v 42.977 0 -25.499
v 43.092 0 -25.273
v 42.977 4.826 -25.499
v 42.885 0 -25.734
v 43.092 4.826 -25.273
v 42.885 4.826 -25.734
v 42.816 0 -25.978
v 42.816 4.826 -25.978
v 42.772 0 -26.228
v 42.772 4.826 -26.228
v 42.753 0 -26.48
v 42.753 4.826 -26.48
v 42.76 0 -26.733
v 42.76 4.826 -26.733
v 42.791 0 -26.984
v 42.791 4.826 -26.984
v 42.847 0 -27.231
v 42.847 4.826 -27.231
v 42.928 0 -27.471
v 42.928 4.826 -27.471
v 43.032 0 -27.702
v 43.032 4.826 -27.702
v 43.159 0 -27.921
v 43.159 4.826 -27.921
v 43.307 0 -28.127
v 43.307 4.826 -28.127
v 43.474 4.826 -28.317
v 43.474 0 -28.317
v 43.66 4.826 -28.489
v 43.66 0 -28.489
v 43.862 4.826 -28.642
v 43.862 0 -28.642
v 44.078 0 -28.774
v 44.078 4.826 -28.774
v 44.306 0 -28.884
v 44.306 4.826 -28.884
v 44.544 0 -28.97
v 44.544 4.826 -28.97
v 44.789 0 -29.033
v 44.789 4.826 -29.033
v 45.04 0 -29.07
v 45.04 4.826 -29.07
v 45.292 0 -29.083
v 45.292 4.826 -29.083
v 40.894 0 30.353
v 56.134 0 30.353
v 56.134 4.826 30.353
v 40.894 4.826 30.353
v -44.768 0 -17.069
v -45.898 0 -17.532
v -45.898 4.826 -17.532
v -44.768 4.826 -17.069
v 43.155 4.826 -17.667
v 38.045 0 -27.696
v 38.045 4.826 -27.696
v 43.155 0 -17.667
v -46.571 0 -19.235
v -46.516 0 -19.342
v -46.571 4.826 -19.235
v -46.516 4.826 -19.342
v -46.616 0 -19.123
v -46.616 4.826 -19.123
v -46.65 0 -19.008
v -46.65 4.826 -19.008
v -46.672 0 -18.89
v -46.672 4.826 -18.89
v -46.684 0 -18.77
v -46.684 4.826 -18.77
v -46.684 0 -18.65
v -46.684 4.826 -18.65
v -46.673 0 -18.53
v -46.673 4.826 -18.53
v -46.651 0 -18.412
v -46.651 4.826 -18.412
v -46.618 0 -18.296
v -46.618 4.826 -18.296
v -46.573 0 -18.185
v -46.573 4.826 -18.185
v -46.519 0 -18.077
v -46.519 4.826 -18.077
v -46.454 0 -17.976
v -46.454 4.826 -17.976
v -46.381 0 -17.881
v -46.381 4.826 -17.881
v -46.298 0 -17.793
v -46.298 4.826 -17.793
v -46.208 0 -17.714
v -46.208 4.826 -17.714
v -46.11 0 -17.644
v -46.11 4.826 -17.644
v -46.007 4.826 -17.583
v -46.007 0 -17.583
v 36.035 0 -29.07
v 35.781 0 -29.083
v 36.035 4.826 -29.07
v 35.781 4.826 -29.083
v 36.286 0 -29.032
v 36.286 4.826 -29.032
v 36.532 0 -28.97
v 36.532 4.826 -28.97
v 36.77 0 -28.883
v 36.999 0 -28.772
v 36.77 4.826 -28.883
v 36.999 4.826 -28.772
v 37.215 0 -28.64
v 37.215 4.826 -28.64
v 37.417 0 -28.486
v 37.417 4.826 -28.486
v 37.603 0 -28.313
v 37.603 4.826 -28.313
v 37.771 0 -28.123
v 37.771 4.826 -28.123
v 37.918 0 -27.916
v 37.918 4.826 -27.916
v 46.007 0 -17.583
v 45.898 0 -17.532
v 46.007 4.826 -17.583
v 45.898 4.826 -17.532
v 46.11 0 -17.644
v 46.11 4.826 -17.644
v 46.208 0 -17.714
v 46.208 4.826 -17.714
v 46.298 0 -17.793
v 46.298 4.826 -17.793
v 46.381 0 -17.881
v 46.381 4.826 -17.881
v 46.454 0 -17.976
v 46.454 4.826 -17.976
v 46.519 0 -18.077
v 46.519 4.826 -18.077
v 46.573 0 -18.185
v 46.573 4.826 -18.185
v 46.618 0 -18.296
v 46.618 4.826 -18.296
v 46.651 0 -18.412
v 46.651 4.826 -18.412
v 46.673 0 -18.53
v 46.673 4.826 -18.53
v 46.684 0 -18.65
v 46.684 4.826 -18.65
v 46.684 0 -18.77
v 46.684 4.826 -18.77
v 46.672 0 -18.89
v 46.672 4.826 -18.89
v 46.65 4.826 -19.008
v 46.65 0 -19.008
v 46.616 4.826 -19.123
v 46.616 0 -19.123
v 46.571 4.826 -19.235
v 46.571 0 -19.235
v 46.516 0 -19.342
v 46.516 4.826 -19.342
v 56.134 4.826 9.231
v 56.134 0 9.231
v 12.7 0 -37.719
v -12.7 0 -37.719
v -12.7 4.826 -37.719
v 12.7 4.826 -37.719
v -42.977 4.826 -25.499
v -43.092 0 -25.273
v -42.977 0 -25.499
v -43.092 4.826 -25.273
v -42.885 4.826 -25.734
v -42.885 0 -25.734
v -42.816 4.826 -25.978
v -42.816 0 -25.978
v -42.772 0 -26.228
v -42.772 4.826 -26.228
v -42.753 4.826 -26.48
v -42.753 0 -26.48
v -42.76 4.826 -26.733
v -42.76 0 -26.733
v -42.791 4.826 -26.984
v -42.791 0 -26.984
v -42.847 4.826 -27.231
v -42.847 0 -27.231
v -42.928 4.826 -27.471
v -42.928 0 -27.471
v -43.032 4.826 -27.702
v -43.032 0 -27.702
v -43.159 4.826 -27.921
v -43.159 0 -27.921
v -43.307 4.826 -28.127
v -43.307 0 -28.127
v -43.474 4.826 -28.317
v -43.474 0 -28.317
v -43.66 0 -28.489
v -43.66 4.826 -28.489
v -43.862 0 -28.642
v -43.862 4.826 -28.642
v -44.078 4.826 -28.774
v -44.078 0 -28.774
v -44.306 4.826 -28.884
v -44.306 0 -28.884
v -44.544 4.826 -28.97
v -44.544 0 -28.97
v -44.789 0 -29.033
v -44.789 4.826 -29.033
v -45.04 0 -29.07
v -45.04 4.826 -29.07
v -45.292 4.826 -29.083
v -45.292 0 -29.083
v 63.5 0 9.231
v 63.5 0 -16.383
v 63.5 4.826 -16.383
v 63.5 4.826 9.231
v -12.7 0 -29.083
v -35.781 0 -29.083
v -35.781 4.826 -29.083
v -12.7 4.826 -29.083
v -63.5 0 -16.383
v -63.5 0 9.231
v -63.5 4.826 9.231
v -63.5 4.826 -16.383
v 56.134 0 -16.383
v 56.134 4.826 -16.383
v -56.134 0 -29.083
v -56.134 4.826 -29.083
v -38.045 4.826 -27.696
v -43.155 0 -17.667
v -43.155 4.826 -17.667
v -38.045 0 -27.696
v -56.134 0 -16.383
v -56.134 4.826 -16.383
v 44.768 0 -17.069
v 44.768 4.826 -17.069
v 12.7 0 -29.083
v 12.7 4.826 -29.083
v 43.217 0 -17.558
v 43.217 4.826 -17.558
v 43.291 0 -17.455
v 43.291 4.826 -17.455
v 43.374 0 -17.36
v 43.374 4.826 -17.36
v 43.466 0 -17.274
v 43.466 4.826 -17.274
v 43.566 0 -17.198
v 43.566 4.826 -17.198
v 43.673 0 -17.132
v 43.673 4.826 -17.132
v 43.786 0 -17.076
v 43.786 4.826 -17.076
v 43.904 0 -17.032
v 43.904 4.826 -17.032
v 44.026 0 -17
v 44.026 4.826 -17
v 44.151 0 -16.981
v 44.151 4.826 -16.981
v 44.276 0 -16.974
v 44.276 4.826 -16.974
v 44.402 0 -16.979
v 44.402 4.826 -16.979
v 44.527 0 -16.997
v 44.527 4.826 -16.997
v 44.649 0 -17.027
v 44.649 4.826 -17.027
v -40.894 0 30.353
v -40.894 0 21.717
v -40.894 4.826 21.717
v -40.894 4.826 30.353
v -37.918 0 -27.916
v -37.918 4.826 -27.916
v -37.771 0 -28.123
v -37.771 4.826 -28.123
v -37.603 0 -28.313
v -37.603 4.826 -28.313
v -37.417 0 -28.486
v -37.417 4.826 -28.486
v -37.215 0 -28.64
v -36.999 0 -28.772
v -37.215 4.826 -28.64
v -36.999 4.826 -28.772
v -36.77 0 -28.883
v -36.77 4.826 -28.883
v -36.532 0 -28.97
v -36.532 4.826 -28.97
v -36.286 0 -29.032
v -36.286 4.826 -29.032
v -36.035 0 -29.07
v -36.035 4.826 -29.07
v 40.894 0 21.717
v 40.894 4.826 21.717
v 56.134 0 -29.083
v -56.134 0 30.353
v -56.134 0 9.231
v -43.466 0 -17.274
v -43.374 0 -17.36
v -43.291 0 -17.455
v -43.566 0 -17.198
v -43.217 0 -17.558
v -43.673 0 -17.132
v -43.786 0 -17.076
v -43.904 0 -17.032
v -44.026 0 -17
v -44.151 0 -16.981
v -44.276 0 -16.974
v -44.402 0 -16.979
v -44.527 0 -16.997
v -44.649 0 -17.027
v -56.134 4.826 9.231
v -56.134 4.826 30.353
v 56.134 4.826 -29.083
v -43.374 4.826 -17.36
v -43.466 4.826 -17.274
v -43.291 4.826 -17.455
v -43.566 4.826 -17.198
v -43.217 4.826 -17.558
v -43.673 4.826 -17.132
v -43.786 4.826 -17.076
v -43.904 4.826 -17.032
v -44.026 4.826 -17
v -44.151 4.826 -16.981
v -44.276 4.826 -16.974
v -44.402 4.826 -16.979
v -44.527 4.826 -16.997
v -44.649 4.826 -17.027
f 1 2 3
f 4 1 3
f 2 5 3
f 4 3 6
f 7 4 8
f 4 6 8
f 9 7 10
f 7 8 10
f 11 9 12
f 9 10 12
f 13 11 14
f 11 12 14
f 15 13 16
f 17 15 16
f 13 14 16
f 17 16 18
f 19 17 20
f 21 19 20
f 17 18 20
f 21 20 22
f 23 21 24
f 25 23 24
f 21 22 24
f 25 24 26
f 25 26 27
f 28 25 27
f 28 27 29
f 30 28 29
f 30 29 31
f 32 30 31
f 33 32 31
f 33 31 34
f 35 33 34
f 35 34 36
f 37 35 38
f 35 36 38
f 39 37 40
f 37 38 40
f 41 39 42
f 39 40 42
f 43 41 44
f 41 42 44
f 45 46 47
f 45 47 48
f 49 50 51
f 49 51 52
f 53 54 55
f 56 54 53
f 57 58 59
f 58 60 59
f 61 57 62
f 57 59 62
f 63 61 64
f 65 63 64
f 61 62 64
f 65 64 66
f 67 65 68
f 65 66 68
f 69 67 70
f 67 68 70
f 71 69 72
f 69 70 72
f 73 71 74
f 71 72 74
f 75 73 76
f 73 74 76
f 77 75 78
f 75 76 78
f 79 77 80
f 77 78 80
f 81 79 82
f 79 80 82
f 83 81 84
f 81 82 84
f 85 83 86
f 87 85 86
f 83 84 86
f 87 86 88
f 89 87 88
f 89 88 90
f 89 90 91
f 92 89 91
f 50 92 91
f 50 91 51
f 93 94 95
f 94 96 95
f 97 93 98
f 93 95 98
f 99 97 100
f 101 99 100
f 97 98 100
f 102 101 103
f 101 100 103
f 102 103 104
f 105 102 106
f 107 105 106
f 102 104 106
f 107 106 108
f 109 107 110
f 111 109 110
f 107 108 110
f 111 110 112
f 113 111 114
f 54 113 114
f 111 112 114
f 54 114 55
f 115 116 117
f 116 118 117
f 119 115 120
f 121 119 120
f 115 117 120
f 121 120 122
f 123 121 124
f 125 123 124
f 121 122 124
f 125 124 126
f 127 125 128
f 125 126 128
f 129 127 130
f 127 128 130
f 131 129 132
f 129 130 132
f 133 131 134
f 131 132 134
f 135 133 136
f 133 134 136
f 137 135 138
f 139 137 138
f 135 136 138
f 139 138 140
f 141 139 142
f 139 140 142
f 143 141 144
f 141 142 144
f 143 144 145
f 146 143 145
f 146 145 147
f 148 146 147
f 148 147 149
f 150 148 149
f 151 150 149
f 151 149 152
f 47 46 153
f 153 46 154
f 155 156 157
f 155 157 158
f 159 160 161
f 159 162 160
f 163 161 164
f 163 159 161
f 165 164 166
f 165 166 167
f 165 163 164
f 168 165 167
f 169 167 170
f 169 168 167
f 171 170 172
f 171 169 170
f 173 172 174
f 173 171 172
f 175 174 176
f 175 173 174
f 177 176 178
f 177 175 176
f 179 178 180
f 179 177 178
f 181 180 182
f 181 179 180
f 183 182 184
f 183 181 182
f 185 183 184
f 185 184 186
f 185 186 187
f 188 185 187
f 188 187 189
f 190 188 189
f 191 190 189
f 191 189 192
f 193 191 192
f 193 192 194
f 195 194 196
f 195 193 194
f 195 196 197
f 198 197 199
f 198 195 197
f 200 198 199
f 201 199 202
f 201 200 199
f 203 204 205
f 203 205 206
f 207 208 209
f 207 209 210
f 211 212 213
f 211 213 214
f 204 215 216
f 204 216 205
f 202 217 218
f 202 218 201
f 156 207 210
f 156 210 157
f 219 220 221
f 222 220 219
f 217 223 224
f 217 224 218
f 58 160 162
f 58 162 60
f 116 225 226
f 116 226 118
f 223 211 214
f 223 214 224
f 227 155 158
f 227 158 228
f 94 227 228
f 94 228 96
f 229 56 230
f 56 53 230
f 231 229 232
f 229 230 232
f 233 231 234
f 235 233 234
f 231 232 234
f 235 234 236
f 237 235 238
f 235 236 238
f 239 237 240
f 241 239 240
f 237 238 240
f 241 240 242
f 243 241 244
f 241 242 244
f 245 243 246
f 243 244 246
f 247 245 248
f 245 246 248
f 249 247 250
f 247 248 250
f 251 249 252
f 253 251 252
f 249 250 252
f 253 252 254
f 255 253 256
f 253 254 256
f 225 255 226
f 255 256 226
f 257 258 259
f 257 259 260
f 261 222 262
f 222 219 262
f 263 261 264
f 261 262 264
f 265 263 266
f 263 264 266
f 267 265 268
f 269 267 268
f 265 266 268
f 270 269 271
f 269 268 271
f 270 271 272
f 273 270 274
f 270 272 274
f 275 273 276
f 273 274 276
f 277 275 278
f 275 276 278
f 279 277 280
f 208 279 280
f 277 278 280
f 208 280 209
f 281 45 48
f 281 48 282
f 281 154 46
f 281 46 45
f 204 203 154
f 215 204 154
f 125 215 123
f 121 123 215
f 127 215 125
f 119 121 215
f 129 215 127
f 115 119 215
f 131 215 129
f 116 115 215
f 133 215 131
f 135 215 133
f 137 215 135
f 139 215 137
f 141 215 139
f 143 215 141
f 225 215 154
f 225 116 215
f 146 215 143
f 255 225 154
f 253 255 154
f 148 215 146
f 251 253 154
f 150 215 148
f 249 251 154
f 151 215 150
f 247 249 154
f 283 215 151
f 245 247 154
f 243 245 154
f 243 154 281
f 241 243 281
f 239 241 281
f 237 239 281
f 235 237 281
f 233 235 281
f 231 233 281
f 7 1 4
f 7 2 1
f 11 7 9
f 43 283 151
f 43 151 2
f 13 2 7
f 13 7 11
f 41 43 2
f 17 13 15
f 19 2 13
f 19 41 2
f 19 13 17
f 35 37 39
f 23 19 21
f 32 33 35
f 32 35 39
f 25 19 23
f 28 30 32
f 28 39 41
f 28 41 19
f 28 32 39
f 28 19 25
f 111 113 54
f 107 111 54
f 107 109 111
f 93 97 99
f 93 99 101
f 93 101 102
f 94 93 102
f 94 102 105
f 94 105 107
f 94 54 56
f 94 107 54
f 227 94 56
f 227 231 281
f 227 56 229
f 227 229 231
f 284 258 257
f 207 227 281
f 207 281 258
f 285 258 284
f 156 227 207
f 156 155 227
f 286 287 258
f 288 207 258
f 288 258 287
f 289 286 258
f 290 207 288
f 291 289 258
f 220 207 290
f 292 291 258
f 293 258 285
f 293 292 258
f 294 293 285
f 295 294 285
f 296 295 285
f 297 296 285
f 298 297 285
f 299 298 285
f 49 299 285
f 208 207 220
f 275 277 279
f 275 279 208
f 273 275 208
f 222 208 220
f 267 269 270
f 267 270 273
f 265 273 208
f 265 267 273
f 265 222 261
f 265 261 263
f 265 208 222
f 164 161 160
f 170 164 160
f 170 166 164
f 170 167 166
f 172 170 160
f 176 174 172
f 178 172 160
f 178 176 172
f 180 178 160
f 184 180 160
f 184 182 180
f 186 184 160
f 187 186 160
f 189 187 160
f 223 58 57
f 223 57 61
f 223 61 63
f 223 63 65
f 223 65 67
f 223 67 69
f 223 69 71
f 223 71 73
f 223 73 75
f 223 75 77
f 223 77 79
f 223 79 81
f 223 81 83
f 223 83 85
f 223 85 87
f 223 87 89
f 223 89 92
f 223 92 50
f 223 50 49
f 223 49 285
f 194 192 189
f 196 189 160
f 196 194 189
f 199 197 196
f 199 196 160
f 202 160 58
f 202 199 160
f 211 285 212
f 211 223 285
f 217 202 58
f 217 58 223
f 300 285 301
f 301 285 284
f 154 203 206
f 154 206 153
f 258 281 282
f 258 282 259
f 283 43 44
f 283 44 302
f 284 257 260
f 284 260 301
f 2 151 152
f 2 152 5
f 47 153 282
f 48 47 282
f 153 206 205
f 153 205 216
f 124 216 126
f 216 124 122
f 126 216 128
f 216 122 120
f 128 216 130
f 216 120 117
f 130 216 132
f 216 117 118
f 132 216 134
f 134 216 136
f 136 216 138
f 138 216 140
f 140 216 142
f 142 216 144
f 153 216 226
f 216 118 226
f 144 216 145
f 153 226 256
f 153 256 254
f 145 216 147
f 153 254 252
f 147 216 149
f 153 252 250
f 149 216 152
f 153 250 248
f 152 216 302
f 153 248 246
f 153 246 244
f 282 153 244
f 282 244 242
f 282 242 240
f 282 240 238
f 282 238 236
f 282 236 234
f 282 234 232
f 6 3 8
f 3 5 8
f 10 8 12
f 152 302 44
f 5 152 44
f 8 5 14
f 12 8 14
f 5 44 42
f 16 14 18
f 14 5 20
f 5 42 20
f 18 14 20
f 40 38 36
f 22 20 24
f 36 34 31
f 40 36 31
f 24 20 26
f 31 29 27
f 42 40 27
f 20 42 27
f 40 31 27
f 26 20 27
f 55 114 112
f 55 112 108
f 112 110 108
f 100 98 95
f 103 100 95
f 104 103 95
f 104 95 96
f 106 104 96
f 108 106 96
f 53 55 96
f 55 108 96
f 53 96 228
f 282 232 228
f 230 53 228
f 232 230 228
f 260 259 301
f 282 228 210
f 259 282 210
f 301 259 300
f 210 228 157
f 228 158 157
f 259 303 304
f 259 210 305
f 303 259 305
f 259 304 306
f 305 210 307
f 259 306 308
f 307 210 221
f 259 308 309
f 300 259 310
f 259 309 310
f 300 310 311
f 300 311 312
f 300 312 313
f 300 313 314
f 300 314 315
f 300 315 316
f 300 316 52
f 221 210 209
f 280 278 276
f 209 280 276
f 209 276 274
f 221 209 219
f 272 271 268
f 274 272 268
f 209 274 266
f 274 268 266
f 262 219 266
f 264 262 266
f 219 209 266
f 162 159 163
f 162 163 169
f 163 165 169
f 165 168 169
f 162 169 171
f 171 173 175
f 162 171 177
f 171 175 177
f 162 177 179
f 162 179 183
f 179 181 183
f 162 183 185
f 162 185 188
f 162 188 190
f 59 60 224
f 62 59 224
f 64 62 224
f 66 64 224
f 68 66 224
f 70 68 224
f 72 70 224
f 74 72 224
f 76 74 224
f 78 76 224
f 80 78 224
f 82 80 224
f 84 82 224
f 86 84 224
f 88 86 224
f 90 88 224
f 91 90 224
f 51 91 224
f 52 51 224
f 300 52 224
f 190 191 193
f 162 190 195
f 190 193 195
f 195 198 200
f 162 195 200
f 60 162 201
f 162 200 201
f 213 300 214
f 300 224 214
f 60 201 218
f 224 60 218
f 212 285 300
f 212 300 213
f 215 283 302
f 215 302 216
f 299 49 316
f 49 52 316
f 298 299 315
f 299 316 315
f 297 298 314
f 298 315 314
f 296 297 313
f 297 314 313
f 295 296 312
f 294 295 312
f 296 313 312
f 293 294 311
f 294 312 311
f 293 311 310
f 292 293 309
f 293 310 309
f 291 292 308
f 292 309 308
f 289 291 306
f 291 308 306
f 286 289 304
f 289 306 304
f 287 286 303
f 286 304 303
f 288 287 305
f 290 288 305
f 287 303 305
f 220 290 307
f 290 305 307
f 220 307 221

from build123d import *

# Parameters (mm, degrees)
BOSS_EXTRUDE1_DEPTH = 4.826
FILLET1_R           = 1.27
FILLET2_R           = 2.54


with BuildPart() as part:
    # Sketch1 → Boss-Extrude1 (new body)
    with BuildSketch(Plane(origin=(0, 0, 0), x_dir=(1, 0, 0), z_dir=(0, 1, 0))):
        Polygon((-56.134, 29.083), (-40.894, 29.083), (-47.241885042, 18.083256572), (-43.685885042, 16.624574128), (-37.338, 29.083), (-12.7, 29.083), (-12.7, 37.719), (12.7, 37.719), (12.7, 29.083), (37.338, 29.083), (43.685885042, 16.624574128), (47.241885042, 18.083256572), (40.894, 29.083), (56.134, 29.083), (56.134, 16.383), (63.5, 16.383), (63.5, -9.230617291), (56.134, -9.230617291), (56.134, -29.083), (56.134, -30.353), (40.894, -30.353), (40.894, -21.717), (-40.894, -21.717), (-40.894, -30.353), (-56.134, -30.353), (-56.134, -29.083), (-56.134, -9.230617291), (-63.5, -9.230617291), (-63.5, 16.383), (-56.134, 16.383), align=None)
    extrude(amount=BOSS_EXTRUDE1_DEPTH)

    # Fillet1
    fillet1_edges = [part.edges().sort_by_distance(p)[0] for p in [
        (-47.241885042, 2.413, -18.083256572),
        (-43.685885042, 2.413, -16.624574128),
        (43.685885042, 2.413, -16.624574128),
        (47.241885042, 2.413, -18.083256572),
    ]]
    fillet(fillet1_edges, radius=FILLET1_R)

    # Fillet2
    fillet2_edges = [part.edges().sort_by_distance(p)[0] for p in [
        (-40.894, 2.413, -29.083),
        (-37.338, 2.413, -29.083),
        (37.338, 2.413, -29.083),
        (40.894, 2.413, -29.083),
    ]]
    fillet(fillet2_edges, radius=FILLET2_R)


solid = part.part
